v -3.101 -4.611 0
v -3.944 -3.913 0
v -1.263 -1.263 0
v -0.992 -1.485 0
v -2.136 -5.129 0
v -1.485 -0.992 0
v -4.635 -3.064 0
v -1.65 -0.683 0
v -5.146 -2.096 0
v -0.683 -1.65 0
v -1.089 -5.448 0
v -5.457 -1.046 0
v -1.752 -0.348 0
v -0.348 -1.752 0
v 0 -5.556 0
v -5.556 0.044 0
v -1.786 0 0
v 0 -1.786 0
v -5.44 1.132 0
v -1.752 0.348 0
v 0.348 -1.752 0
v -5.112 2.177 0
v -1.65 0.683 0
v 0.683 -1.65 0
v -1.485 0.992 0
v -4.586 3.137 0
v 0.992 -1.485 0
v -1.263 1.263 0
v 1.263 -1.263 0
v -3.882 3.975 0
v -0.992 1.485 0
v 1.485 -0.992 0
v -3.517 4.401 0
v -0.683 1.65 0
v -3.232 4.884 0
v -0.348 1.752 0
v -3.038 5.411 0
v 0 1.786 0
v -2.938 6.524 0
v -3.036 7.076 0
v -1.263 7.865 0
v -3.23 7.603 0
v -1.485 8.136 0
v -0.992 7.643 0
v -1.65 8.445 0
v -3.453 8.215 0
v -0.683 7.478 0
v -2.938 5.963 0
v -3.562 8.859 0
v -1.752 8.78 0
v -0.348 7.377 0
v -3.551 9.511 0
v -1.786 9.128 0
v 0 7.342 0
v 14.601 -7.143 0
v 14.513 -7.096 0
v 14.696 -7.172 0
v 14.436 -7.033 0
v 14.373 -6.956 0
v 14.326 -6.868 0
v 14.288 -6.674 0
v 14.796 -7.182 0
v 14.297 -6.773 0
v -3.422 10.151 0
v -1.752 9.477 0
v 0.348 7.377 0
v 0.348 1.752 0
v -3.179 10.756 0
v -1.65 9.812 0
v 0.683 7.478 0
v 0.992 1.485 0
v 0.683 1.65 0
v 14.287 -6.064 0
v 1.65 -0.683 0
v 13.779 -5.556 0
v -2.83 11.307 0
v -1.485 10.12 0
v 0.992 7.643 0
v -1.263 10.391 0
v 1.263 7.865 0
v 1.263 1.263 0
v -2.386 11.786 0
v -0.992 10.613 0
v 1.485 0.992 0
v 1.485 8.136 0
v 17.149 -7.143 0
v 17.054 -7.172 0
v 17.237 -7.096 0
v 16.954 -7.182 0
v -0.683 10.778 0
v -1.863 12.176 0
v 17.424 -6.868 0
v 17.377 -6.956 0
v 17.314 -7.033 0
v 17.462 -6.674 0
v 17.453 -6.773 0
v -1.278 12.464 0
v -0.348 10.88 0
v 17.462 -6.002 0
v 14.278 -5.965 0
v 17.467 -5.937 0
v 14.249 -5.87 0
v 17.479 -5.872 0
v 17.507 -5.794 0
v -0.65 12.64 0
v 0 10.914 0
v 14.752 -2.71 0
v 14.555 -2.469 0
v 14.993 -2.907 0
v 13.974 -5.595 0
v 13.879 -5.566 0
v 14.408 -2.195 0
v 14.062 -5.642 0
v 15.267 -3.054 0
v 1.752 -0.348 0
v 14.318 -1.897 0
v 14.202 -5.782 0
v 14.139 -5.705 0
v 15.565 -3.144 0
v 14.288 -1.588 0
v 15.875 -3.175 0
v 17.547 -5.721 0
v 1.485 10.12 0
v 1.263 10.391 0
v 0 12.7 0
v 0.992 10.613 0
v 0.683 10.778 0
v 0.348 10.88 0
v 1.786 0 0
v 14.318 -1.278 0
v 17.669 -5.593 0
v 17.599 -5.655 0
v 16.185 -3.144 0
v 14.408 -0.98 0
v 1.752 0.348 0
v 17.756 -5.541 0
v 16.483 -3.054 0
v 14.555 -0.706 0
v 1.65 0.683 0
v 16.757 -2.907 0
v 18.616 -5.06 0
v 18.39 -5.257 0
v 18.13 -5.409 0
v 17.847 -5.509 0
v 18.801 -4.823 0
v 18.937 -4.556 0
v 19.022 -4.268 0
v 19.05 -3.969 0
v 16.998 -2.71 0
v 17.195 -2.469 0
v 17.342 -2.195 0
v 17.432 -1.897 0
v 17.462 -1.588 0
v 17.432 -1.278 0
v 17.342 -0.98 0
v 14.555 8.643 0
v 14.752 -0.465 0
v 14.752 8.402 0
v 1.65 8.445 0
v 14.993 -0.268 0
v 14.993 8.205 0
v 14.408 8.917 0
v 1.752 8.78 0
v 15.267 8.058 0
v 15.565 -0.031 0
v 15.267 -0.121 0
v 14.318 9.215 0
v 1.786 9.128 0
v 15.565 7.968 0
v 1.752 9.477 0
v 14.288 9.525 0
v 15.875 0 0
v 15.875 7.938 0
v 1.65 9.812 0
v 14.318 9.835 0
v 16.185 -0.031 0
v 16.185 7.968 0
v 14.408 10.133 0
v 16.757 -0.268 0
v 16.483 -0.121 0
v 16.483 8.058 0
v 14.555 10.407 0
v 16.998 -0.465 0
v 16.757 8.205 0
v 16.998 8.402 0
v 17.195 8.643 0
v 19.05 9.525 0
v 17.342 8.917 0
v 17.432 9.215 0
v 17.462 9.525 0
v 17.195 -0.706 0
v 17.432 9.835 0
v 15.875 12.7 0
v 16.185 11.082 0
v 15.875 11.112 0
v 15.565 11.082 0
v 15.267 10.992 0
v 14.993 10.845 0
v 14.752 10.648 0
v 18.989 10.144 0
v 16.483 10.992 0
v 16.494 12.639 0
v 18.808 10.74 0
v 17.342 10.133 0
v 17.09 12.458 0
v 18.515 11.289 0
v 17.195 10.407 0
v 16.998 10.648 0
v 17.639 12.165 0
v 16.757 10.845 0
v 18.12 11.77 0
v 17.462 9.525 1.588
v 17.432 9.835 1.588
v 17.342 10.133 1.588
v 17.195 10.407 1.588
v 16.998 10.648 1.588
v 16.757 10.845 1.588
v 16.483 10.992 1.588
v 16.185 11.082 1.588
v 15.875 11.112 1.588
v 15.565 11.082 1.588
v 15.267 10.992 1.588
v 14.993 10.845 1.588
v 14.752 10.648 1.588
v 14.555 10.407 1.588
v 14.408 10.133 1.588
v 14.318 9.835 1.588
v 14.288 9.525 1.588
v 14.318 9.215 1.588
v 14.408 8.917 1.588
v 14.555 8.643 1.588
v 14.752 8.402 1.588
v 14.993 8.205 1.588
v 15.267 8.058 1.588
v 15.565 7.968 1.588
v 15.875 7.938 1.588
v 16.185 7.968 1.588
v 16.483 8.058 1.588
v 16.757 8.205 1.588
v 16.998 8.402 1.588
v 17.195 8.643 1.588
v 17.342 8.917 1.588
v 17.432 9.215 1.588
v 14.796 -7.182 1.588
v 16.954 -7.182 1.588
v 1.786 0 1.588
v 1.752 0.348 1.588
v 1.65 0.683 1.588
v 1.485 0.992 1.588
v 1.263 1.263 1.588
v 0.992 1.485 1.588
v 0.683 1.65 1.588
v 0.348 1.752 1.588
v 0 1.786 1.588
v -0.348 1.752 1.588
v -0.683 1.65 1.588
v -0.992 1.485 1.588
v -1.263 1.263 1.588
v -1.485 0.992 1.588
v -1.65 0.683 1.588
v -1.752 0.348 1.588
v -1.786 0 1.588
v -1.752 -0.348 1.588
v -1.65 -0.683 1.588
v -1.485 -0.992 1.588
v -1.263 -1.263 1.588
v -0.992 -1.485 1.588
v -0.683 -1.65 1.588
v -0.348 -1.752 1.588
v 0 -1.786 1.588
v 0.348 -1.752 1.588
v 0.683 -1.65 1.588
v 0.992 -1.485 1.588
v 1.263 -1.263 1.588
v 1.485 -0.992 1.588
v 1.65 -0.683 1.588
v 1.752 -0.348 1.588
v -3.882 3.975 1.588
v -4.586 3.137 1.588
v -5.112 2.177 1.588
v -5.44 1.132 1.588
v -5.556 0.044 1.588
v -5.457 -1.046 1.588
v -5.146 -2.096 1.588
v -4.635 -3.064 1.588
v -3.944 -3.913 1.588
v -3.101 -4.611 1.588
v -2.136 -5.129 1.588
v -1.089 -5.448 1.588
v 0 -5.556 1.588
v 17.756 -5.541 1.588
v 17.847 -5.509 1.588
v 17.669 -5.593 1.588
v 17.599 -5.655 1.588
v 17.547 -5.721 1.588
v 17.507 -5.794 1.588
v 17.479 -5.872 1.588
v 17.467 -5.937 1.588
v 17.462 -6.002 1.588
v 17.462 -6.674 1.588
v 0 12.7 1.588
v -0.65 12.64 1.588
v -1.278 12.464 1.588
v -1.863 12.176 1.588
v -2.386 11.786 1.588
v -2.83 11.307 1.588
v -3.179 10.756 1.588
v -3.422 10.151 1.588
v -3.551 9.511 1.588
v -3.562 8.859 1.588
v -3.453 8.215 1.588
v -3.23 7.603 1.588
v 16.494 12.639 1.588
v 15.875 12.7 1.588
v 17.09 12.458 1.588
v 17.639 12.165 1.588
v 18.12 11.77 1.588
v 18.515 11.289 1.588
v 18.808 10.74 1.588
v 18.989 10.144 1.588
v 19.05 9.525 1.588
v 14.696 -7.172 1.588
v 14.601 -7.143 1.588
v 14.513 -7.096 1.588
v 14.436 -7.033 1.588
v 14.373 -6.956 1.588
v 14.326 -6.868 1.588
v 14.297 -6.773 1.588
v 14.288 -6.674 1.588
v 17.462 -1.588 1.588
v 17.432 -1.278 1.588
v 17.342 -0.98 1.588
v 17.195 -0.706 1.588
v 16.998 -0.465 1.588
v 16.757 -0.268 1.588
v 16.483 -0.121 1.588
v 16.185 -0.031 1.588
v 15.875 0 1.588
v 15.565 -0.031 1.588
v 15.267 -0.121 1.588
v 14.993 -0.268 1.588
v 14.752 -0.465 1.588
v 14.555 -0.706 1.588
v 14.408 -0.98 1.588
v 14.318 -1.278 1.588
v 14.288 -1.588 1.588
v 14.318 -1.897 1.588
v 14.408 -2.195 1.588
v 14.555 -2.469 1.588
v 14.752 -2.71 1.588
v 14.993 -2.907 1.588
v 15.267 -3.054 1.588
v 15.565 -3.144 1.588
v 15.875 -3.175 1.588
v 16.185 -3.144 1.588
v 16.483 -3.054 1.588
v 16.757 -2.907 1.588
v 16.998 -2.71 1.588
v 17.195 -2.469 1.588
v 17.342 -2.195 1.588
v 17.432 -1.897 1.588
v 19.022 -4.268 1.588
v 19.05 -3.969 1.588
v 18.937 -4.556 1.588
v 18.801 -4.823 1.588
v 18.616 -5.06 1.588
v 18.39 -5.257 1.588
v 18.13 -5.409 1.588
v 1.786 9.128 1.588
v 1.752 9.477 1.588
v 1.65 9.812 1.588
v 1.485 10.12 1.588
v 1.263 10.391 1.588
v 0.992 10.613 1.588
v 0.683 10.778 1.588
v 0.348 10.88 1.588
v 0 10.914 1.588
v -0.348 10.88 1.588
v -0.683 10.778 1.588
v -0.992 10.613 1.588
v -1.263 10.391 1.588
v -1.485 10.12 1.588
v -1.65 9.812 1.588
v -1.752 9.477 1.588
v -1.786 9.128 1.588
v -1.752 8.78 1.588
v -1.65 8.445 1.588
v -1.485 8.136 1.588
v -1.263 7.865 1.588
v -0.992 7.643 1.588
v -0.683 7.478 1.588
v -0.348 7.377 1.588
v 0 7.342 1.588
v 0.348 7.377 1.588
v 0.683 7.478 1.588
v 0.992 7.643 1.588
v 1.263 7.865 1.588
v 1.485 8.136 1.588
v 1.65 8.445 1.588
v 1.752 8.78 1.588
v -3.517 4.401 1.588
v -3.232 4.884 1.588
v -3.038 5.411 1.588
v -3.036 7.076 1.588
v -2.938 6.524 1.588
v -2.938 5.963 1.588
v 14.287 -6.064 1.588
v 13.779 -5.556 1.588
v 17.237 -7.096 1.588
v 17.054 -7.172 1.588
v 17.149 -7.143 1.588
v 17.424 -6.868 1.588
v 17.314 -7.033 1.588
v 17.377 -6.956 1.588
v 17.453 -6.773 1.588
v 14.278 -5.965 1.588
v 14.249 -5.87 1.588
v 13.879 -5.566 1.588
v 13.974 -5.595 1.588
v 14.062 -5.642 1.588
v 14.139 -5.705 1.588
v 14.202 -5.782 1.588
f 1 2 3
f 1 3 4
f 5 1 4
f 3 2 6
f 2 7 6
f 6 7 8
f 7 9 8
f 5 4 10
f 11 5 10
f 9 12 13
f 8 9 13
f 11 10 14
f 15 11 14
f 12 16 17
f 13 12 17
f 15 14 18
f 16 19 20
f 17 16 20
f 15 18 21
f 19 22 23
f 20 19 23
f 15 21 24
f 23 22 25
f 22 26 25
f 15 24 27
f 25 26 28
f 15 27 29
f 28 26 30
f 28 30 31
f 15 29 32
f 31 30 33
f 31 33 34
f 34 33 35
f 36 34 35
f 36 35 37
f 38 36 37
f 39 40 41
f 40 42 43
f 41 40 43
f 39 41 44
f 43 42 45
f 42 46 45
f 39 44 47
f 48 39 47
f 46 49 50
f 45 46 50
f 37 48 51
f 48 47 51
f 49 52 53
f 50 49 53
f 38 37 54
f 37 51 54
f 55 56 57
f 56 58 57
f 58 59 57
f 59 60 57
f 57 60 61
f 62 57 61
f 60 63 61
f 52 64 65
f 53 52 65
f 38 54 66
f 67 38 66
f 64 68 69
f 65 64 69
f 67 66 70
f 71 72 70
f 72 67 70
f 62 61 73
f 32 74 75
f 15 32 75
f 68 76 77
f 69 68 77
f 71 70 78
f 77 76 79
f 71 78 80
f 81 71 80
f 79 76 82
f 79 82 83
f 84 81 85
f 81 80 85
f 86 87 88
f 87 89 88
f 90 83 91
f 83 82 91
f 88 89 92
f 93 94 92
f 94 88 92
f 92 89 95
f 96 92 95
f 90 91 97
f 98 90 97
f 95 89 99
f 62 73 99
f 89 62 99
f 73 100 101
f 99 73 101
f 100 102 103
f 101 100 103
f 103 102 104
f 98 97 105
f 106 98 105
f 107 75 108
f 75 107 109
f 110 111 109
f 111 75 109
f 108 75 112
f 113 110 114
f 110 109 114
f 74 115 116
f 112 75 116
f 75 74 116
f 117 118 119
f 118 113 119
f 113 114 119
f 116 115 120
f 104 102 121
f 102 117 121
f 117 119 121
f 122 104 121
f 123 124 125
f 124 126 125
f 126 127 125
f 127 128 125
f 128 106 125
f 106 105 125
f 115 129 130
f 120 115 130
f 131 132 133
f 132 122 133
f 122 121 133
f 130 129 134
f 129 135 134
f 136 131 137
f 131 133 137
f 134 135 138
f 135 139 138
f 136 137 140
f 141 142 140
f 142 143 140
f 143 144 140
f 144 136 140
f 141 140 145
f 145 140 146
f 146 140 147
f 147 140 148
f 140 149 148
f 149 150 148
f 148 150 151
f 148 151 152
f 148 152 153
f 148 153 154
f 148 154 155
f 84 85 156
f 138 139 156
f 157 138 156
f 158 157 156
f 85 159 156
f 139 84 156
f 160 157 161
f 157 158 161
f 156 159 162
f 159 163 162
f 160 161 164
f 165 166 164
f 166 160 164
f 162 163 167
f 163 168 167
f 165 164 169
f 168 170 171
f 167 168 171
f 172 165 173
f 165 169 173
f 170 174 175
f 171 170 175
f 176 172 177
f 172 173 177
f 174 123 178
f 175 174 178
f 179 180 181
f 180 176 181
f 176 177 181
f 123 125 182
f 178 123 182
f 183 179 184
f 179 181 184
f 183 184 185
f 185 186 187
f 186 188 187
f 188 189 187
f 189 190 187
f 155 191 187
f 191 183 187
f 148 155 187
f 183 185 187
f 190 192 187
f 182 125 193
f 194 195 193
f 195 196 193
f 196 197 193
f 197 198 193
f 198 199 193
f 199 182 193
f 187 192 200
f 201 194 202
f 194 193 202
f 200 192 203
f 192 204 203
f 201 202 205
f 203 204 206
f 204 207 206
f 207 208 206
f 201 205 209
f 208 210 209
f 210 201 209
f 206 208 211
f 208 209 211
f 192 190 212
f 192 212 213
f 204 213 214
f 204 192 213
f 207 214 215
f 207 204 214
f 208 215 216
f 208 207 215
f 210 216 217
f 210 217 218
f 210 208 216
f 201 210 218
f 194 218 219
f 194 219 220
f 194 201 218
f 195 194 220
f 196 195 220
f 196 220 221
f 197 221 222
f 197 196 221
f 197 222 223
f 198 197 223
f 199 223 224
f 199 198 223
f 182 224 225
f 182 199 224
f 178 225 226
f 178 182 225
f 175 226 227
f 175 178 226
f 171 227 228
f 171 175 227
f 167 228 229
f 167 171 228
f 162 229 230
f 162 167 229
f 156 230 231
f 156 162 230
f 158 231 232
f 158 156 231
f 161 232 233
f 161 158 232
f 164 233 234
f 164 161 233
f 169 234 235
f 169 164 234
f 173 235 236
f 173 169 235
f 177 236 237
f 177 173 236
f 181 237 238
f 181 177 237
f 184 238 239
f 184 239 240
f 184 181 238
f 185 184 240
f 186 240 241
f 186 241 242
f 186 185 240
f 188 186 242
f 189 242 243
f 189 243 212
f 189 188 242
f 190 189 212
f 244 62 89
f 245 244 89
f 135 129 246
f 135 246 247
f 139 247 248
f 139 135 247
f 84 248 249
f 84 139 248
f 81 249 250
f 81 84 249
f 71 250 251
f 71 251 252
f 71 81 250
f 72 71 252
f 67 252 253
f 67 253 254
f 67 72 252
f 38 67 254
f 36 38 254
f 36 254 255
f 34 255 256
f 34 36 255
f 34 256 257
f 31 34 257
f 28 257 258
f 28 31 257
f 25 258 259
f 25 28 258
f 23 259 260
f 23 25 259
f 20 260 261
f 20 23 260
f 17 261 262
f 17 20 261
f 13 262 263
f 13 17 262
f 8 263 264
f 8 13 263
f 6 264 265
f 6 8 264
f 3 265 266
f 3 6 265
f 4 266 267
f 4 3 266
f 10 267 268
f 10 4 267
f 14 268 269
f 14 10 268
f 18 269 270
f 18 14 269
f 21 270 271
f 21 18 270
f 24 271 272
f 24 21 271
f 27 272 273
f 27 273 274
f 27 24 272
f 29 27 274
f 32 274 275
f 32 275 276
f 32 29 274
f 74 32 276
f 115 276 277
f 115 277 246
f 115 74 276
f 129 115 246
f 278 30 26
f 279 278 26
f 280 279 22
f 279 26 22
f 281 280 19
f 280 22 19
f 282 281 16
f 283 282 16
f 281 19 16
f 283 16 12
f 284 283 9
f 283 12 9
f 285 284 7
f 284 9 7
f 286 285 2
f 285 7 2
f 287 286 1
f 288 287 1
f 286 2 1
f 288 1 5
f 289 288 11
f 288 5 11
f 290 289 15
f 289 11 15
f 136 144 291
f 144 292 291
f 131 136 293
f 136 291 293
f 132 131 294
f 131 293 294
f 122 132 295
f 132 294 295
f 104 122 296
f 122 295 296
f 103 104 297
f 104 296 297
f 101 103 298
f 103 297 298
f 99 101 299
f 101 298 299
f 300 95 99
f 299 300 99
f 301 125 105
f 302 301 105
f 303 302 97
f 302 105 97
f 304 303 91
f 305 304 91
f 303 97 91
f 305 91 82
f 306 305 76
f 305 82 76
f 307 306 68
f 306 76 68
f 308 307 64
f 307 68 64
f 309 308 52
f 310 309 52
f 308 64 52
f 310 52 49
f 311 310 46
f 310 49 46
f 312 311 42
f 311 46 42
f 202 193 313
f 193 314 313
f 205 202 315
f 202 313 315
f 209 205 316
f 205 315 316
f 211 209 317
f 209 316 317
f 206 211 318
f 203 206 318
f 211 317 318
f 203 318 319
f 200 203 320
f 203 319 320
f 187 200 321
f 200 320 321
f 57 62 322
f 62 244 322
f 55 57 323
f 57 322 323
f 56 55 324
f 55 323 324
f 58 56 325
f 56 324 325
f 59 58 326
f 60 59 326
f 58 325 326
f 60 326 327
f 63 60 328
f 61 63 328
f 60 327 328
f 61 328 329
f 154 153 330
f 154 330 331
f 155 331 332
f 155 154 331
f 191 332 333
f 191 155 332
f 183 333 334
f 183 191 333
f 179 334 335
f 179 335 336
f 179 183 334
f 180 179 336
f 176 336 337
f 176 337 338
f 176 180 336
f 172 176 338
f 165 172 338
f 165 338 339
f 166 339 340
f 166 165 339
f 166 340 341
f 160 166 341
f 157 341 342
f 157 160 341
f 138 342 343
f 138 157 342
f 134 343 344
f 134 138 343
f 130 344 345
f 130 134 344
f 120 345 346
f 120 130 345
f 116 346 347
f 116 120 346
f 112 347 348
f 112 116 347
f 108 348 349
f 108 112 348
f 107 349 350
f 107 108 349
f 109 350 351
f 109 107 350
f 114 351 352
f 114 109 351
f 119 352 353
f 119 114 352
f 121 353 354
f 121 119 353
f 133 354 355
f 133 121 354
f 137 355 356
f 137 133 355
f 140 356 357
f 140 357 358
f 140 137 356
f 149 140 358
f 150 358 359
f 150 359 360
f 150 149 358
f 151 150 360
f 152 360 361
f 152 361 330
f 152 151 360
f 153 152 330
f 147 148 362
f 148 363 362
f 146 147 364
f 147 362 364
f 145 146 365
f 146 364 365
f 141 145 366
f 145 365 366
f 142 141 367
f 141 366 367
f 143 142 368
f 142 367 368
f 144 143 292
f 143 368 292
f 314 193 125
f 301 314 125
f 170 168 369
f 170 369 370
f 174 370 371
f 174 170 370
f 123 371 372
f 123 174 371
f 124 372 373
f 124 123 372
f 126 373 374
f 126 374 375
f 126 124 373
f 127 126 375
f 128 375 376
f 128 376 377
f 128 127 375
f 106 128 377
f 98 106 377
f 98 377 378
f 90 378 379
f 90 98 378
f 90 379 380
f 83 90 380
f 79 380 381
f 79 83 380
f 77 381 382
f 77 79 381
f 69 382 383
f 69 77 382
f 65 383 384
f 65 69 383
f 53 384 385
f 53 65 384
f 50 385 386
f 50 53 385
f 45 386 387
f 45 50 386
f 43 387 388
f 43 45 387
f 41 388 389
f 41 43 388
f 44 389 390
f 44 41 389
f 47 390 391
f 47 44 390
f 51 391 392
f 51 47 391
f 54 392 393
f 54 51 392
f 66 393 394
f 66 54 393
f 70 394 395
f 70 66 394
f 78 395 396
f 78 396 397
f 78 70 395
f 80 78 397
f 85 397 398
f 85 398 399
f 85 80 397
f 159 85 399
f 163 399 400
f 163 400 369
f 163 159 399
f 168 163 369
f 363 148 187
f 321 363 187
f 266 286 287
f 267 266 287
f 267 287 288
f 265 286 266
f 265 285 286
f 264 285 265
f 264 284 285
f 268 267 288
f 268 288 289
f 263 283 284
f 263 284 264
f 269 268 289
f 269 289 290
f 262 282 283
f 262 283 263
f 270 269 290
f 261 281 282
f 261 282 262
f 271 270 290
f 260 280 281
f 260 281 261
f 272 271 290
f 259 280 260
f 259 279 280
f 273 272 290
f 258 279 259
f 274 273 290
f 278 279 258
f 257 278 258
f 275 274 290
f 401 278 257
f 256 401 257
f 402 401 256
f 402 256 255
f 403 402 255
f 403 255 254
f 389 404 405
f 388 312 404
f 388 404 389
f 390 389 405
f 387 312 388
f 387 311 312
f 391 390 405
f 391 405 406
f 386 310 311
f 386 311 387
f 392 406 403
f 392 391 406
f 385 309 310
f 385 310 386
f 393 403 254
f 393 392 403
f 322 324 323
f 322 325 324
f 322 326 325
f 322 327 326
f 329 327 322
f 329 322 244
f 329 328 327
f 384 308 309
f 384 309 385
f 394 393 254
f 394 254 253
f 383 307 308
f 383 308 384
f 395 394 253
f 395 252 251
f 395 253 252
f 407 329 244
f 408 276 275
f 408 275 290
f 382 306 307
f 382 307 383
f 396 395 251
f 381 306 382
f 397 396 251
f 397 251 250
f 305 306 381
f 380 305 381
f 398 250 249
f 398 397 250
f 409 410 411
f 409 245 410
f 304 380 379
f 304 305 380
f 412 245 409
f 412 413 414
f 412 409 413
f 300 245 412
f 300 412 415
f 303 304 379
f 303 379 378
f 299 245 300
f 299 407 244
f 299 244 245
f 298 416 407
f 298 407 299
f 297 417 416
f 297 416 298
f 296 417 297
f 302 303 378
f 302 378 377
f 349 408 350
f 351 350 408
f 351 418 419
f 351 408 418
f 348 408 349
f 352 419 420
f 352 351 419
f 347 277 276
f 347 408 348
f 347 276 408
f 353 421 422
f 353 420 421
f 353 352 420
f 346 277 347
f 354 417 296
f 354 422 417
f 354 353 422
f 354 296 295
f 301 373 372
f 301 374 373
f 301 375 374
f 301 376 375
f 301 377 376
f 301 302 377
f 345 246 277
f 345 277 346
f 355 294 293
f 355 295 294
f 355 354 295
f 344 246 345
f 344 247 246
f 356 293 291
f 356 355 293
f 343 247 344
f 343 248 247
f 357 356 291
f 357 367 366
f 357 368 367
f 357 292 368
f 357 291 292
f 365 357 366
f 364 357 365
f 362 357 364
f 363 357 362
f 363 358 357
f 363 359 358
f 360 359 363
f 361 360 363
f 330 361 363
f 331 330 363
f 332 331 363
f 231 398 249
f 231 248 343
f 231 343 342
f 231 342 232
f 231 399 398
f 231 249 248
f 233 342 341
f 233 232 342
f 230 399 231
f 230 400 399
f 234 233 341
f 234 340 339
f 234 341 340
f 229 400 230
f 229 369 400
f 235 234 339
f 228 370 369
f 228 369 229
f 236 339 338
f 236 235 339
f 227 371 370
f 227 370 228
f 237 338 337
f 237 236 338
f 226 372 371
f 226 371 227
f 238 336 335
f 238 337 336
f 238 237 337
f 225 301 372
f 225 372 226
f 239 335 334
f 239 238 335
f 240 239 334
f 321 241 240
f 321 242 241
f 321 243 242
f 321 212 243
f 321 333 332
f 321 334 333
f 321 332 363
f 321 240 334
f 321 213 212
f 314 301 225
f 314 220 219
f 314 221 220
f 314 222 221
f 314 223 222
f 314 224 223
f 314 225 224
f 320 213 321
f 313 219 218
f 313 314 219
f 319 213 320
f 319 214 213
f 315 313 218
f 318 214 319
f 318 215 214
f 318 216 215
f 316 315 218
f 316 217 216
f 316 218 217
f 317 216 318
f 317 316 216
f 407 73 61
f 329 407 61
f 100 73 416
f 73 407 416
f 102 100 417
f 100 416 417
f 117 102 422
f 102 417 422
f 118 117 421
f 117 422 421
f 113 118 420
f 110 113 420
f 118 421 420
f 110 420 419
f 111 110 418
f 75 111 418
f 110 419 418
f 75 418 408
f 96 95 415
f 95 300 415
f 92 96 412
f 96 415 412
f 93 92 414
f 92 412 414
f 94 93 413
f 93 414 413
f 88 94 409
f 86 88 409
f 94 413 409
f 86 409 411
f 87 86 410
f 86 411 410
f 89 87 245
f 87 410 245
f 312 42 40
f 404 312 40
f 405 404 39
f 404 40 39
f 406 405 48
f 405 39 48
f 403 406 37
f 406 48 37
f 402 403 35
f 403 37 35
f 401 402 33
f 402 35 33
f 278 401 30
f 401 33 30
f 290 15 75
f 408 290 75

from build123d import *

# Parameters (mm, degrees)
SKETCH2_R           = 1.5875
SKETCH2_R_2         = 1.7859375
BOSS_EXTRUDE1_DEPTH = 1.5875
FILLET1_R           = 3.175
FILLET3_R           = 1.5875
FILLET2_R           = 0.508


with BuildPart() as part:
    # Sketch2 → Boss-Extrude1 (new body)
    with BuildSketch(Plane.XY):
        with BuildLine():
            ThreePointArc((-3.882150485, 3.975024739), (-5.145782024, -2.095910644), (0, -5.55625))
            Line((0, -5.55625), (14.2875, -5.55625))
            Line((14.2875, -5.55625), (14.2875, -7.18185))
            Line((14.2875, -7.18185), (17.4625, -7.18185))
            Line((17.4625, -7.18185), (17.4625, -5.55625))
            Line((17.4625, -5.55625), (19.05, -5.55625))
            Line((19.05, -5.55625), (19.05, 12.7))
            Line((19.05, 12.7), (0, 12.7))
            ThreePointArc((0, 12.7), (-3.017240848, 11.039812391), (-3.229688208, 7.602541474))
            ThreePointArc((-3.229688208, 7.602541474), (-2.975666516, 5.684416094), (-3.882150485, 3.975024739))
        make_face()
        with Locations((15.875, 9.525)):
            Circle(SKETCH2_R, mode=Mode.SUBTRACT)
        with Locations((15.875, -1.5875)):
            Circle(SKETCH2_R, mode=Mode.SUBTRACT)
        Circle(SKETCH2_R_2, mode=Mode.SUBTRACT)
        with Locations((0, 9.128125)):
            Circle(SKETCH2_R_2, mode=Mode.SUBTRACT)
    extrude(amount=BOSS_EXTRUDE1_DEPTH)

    # Fillet1
    fillet1_edges = [part.edges().sort_by_distance(p)[0] for p in [
        (19.05, 12.7, 0.79375),
    ]]
    fillet(fillet1_edges, radius=FILLET1_R)

    # Fillet3
    fillet3_edges = [part.edges().sort_by_distance(p)[0] for p in [
        (19.05, -5.55625, 0.79375),
    ]]
    fillet(fillet3_edges, radius=FILLET3_R - 0.0001)  # a hair under: the kernel refuses the full size

    # Fillet2
    fillet2_edges = [part.edges().sort_by_distance(p)[0] for p in [
        (17.4625, -5.55625, 0.79375),
        (17.4625, -7.18185, 0.79375),
        (14.2875, -7.18185, 0.79375),
        (14.2875, -5.55625, 0.79375),
    ]]
    fillet(fillet2_edges, radius=FILLET2_R)


solid = part.part
